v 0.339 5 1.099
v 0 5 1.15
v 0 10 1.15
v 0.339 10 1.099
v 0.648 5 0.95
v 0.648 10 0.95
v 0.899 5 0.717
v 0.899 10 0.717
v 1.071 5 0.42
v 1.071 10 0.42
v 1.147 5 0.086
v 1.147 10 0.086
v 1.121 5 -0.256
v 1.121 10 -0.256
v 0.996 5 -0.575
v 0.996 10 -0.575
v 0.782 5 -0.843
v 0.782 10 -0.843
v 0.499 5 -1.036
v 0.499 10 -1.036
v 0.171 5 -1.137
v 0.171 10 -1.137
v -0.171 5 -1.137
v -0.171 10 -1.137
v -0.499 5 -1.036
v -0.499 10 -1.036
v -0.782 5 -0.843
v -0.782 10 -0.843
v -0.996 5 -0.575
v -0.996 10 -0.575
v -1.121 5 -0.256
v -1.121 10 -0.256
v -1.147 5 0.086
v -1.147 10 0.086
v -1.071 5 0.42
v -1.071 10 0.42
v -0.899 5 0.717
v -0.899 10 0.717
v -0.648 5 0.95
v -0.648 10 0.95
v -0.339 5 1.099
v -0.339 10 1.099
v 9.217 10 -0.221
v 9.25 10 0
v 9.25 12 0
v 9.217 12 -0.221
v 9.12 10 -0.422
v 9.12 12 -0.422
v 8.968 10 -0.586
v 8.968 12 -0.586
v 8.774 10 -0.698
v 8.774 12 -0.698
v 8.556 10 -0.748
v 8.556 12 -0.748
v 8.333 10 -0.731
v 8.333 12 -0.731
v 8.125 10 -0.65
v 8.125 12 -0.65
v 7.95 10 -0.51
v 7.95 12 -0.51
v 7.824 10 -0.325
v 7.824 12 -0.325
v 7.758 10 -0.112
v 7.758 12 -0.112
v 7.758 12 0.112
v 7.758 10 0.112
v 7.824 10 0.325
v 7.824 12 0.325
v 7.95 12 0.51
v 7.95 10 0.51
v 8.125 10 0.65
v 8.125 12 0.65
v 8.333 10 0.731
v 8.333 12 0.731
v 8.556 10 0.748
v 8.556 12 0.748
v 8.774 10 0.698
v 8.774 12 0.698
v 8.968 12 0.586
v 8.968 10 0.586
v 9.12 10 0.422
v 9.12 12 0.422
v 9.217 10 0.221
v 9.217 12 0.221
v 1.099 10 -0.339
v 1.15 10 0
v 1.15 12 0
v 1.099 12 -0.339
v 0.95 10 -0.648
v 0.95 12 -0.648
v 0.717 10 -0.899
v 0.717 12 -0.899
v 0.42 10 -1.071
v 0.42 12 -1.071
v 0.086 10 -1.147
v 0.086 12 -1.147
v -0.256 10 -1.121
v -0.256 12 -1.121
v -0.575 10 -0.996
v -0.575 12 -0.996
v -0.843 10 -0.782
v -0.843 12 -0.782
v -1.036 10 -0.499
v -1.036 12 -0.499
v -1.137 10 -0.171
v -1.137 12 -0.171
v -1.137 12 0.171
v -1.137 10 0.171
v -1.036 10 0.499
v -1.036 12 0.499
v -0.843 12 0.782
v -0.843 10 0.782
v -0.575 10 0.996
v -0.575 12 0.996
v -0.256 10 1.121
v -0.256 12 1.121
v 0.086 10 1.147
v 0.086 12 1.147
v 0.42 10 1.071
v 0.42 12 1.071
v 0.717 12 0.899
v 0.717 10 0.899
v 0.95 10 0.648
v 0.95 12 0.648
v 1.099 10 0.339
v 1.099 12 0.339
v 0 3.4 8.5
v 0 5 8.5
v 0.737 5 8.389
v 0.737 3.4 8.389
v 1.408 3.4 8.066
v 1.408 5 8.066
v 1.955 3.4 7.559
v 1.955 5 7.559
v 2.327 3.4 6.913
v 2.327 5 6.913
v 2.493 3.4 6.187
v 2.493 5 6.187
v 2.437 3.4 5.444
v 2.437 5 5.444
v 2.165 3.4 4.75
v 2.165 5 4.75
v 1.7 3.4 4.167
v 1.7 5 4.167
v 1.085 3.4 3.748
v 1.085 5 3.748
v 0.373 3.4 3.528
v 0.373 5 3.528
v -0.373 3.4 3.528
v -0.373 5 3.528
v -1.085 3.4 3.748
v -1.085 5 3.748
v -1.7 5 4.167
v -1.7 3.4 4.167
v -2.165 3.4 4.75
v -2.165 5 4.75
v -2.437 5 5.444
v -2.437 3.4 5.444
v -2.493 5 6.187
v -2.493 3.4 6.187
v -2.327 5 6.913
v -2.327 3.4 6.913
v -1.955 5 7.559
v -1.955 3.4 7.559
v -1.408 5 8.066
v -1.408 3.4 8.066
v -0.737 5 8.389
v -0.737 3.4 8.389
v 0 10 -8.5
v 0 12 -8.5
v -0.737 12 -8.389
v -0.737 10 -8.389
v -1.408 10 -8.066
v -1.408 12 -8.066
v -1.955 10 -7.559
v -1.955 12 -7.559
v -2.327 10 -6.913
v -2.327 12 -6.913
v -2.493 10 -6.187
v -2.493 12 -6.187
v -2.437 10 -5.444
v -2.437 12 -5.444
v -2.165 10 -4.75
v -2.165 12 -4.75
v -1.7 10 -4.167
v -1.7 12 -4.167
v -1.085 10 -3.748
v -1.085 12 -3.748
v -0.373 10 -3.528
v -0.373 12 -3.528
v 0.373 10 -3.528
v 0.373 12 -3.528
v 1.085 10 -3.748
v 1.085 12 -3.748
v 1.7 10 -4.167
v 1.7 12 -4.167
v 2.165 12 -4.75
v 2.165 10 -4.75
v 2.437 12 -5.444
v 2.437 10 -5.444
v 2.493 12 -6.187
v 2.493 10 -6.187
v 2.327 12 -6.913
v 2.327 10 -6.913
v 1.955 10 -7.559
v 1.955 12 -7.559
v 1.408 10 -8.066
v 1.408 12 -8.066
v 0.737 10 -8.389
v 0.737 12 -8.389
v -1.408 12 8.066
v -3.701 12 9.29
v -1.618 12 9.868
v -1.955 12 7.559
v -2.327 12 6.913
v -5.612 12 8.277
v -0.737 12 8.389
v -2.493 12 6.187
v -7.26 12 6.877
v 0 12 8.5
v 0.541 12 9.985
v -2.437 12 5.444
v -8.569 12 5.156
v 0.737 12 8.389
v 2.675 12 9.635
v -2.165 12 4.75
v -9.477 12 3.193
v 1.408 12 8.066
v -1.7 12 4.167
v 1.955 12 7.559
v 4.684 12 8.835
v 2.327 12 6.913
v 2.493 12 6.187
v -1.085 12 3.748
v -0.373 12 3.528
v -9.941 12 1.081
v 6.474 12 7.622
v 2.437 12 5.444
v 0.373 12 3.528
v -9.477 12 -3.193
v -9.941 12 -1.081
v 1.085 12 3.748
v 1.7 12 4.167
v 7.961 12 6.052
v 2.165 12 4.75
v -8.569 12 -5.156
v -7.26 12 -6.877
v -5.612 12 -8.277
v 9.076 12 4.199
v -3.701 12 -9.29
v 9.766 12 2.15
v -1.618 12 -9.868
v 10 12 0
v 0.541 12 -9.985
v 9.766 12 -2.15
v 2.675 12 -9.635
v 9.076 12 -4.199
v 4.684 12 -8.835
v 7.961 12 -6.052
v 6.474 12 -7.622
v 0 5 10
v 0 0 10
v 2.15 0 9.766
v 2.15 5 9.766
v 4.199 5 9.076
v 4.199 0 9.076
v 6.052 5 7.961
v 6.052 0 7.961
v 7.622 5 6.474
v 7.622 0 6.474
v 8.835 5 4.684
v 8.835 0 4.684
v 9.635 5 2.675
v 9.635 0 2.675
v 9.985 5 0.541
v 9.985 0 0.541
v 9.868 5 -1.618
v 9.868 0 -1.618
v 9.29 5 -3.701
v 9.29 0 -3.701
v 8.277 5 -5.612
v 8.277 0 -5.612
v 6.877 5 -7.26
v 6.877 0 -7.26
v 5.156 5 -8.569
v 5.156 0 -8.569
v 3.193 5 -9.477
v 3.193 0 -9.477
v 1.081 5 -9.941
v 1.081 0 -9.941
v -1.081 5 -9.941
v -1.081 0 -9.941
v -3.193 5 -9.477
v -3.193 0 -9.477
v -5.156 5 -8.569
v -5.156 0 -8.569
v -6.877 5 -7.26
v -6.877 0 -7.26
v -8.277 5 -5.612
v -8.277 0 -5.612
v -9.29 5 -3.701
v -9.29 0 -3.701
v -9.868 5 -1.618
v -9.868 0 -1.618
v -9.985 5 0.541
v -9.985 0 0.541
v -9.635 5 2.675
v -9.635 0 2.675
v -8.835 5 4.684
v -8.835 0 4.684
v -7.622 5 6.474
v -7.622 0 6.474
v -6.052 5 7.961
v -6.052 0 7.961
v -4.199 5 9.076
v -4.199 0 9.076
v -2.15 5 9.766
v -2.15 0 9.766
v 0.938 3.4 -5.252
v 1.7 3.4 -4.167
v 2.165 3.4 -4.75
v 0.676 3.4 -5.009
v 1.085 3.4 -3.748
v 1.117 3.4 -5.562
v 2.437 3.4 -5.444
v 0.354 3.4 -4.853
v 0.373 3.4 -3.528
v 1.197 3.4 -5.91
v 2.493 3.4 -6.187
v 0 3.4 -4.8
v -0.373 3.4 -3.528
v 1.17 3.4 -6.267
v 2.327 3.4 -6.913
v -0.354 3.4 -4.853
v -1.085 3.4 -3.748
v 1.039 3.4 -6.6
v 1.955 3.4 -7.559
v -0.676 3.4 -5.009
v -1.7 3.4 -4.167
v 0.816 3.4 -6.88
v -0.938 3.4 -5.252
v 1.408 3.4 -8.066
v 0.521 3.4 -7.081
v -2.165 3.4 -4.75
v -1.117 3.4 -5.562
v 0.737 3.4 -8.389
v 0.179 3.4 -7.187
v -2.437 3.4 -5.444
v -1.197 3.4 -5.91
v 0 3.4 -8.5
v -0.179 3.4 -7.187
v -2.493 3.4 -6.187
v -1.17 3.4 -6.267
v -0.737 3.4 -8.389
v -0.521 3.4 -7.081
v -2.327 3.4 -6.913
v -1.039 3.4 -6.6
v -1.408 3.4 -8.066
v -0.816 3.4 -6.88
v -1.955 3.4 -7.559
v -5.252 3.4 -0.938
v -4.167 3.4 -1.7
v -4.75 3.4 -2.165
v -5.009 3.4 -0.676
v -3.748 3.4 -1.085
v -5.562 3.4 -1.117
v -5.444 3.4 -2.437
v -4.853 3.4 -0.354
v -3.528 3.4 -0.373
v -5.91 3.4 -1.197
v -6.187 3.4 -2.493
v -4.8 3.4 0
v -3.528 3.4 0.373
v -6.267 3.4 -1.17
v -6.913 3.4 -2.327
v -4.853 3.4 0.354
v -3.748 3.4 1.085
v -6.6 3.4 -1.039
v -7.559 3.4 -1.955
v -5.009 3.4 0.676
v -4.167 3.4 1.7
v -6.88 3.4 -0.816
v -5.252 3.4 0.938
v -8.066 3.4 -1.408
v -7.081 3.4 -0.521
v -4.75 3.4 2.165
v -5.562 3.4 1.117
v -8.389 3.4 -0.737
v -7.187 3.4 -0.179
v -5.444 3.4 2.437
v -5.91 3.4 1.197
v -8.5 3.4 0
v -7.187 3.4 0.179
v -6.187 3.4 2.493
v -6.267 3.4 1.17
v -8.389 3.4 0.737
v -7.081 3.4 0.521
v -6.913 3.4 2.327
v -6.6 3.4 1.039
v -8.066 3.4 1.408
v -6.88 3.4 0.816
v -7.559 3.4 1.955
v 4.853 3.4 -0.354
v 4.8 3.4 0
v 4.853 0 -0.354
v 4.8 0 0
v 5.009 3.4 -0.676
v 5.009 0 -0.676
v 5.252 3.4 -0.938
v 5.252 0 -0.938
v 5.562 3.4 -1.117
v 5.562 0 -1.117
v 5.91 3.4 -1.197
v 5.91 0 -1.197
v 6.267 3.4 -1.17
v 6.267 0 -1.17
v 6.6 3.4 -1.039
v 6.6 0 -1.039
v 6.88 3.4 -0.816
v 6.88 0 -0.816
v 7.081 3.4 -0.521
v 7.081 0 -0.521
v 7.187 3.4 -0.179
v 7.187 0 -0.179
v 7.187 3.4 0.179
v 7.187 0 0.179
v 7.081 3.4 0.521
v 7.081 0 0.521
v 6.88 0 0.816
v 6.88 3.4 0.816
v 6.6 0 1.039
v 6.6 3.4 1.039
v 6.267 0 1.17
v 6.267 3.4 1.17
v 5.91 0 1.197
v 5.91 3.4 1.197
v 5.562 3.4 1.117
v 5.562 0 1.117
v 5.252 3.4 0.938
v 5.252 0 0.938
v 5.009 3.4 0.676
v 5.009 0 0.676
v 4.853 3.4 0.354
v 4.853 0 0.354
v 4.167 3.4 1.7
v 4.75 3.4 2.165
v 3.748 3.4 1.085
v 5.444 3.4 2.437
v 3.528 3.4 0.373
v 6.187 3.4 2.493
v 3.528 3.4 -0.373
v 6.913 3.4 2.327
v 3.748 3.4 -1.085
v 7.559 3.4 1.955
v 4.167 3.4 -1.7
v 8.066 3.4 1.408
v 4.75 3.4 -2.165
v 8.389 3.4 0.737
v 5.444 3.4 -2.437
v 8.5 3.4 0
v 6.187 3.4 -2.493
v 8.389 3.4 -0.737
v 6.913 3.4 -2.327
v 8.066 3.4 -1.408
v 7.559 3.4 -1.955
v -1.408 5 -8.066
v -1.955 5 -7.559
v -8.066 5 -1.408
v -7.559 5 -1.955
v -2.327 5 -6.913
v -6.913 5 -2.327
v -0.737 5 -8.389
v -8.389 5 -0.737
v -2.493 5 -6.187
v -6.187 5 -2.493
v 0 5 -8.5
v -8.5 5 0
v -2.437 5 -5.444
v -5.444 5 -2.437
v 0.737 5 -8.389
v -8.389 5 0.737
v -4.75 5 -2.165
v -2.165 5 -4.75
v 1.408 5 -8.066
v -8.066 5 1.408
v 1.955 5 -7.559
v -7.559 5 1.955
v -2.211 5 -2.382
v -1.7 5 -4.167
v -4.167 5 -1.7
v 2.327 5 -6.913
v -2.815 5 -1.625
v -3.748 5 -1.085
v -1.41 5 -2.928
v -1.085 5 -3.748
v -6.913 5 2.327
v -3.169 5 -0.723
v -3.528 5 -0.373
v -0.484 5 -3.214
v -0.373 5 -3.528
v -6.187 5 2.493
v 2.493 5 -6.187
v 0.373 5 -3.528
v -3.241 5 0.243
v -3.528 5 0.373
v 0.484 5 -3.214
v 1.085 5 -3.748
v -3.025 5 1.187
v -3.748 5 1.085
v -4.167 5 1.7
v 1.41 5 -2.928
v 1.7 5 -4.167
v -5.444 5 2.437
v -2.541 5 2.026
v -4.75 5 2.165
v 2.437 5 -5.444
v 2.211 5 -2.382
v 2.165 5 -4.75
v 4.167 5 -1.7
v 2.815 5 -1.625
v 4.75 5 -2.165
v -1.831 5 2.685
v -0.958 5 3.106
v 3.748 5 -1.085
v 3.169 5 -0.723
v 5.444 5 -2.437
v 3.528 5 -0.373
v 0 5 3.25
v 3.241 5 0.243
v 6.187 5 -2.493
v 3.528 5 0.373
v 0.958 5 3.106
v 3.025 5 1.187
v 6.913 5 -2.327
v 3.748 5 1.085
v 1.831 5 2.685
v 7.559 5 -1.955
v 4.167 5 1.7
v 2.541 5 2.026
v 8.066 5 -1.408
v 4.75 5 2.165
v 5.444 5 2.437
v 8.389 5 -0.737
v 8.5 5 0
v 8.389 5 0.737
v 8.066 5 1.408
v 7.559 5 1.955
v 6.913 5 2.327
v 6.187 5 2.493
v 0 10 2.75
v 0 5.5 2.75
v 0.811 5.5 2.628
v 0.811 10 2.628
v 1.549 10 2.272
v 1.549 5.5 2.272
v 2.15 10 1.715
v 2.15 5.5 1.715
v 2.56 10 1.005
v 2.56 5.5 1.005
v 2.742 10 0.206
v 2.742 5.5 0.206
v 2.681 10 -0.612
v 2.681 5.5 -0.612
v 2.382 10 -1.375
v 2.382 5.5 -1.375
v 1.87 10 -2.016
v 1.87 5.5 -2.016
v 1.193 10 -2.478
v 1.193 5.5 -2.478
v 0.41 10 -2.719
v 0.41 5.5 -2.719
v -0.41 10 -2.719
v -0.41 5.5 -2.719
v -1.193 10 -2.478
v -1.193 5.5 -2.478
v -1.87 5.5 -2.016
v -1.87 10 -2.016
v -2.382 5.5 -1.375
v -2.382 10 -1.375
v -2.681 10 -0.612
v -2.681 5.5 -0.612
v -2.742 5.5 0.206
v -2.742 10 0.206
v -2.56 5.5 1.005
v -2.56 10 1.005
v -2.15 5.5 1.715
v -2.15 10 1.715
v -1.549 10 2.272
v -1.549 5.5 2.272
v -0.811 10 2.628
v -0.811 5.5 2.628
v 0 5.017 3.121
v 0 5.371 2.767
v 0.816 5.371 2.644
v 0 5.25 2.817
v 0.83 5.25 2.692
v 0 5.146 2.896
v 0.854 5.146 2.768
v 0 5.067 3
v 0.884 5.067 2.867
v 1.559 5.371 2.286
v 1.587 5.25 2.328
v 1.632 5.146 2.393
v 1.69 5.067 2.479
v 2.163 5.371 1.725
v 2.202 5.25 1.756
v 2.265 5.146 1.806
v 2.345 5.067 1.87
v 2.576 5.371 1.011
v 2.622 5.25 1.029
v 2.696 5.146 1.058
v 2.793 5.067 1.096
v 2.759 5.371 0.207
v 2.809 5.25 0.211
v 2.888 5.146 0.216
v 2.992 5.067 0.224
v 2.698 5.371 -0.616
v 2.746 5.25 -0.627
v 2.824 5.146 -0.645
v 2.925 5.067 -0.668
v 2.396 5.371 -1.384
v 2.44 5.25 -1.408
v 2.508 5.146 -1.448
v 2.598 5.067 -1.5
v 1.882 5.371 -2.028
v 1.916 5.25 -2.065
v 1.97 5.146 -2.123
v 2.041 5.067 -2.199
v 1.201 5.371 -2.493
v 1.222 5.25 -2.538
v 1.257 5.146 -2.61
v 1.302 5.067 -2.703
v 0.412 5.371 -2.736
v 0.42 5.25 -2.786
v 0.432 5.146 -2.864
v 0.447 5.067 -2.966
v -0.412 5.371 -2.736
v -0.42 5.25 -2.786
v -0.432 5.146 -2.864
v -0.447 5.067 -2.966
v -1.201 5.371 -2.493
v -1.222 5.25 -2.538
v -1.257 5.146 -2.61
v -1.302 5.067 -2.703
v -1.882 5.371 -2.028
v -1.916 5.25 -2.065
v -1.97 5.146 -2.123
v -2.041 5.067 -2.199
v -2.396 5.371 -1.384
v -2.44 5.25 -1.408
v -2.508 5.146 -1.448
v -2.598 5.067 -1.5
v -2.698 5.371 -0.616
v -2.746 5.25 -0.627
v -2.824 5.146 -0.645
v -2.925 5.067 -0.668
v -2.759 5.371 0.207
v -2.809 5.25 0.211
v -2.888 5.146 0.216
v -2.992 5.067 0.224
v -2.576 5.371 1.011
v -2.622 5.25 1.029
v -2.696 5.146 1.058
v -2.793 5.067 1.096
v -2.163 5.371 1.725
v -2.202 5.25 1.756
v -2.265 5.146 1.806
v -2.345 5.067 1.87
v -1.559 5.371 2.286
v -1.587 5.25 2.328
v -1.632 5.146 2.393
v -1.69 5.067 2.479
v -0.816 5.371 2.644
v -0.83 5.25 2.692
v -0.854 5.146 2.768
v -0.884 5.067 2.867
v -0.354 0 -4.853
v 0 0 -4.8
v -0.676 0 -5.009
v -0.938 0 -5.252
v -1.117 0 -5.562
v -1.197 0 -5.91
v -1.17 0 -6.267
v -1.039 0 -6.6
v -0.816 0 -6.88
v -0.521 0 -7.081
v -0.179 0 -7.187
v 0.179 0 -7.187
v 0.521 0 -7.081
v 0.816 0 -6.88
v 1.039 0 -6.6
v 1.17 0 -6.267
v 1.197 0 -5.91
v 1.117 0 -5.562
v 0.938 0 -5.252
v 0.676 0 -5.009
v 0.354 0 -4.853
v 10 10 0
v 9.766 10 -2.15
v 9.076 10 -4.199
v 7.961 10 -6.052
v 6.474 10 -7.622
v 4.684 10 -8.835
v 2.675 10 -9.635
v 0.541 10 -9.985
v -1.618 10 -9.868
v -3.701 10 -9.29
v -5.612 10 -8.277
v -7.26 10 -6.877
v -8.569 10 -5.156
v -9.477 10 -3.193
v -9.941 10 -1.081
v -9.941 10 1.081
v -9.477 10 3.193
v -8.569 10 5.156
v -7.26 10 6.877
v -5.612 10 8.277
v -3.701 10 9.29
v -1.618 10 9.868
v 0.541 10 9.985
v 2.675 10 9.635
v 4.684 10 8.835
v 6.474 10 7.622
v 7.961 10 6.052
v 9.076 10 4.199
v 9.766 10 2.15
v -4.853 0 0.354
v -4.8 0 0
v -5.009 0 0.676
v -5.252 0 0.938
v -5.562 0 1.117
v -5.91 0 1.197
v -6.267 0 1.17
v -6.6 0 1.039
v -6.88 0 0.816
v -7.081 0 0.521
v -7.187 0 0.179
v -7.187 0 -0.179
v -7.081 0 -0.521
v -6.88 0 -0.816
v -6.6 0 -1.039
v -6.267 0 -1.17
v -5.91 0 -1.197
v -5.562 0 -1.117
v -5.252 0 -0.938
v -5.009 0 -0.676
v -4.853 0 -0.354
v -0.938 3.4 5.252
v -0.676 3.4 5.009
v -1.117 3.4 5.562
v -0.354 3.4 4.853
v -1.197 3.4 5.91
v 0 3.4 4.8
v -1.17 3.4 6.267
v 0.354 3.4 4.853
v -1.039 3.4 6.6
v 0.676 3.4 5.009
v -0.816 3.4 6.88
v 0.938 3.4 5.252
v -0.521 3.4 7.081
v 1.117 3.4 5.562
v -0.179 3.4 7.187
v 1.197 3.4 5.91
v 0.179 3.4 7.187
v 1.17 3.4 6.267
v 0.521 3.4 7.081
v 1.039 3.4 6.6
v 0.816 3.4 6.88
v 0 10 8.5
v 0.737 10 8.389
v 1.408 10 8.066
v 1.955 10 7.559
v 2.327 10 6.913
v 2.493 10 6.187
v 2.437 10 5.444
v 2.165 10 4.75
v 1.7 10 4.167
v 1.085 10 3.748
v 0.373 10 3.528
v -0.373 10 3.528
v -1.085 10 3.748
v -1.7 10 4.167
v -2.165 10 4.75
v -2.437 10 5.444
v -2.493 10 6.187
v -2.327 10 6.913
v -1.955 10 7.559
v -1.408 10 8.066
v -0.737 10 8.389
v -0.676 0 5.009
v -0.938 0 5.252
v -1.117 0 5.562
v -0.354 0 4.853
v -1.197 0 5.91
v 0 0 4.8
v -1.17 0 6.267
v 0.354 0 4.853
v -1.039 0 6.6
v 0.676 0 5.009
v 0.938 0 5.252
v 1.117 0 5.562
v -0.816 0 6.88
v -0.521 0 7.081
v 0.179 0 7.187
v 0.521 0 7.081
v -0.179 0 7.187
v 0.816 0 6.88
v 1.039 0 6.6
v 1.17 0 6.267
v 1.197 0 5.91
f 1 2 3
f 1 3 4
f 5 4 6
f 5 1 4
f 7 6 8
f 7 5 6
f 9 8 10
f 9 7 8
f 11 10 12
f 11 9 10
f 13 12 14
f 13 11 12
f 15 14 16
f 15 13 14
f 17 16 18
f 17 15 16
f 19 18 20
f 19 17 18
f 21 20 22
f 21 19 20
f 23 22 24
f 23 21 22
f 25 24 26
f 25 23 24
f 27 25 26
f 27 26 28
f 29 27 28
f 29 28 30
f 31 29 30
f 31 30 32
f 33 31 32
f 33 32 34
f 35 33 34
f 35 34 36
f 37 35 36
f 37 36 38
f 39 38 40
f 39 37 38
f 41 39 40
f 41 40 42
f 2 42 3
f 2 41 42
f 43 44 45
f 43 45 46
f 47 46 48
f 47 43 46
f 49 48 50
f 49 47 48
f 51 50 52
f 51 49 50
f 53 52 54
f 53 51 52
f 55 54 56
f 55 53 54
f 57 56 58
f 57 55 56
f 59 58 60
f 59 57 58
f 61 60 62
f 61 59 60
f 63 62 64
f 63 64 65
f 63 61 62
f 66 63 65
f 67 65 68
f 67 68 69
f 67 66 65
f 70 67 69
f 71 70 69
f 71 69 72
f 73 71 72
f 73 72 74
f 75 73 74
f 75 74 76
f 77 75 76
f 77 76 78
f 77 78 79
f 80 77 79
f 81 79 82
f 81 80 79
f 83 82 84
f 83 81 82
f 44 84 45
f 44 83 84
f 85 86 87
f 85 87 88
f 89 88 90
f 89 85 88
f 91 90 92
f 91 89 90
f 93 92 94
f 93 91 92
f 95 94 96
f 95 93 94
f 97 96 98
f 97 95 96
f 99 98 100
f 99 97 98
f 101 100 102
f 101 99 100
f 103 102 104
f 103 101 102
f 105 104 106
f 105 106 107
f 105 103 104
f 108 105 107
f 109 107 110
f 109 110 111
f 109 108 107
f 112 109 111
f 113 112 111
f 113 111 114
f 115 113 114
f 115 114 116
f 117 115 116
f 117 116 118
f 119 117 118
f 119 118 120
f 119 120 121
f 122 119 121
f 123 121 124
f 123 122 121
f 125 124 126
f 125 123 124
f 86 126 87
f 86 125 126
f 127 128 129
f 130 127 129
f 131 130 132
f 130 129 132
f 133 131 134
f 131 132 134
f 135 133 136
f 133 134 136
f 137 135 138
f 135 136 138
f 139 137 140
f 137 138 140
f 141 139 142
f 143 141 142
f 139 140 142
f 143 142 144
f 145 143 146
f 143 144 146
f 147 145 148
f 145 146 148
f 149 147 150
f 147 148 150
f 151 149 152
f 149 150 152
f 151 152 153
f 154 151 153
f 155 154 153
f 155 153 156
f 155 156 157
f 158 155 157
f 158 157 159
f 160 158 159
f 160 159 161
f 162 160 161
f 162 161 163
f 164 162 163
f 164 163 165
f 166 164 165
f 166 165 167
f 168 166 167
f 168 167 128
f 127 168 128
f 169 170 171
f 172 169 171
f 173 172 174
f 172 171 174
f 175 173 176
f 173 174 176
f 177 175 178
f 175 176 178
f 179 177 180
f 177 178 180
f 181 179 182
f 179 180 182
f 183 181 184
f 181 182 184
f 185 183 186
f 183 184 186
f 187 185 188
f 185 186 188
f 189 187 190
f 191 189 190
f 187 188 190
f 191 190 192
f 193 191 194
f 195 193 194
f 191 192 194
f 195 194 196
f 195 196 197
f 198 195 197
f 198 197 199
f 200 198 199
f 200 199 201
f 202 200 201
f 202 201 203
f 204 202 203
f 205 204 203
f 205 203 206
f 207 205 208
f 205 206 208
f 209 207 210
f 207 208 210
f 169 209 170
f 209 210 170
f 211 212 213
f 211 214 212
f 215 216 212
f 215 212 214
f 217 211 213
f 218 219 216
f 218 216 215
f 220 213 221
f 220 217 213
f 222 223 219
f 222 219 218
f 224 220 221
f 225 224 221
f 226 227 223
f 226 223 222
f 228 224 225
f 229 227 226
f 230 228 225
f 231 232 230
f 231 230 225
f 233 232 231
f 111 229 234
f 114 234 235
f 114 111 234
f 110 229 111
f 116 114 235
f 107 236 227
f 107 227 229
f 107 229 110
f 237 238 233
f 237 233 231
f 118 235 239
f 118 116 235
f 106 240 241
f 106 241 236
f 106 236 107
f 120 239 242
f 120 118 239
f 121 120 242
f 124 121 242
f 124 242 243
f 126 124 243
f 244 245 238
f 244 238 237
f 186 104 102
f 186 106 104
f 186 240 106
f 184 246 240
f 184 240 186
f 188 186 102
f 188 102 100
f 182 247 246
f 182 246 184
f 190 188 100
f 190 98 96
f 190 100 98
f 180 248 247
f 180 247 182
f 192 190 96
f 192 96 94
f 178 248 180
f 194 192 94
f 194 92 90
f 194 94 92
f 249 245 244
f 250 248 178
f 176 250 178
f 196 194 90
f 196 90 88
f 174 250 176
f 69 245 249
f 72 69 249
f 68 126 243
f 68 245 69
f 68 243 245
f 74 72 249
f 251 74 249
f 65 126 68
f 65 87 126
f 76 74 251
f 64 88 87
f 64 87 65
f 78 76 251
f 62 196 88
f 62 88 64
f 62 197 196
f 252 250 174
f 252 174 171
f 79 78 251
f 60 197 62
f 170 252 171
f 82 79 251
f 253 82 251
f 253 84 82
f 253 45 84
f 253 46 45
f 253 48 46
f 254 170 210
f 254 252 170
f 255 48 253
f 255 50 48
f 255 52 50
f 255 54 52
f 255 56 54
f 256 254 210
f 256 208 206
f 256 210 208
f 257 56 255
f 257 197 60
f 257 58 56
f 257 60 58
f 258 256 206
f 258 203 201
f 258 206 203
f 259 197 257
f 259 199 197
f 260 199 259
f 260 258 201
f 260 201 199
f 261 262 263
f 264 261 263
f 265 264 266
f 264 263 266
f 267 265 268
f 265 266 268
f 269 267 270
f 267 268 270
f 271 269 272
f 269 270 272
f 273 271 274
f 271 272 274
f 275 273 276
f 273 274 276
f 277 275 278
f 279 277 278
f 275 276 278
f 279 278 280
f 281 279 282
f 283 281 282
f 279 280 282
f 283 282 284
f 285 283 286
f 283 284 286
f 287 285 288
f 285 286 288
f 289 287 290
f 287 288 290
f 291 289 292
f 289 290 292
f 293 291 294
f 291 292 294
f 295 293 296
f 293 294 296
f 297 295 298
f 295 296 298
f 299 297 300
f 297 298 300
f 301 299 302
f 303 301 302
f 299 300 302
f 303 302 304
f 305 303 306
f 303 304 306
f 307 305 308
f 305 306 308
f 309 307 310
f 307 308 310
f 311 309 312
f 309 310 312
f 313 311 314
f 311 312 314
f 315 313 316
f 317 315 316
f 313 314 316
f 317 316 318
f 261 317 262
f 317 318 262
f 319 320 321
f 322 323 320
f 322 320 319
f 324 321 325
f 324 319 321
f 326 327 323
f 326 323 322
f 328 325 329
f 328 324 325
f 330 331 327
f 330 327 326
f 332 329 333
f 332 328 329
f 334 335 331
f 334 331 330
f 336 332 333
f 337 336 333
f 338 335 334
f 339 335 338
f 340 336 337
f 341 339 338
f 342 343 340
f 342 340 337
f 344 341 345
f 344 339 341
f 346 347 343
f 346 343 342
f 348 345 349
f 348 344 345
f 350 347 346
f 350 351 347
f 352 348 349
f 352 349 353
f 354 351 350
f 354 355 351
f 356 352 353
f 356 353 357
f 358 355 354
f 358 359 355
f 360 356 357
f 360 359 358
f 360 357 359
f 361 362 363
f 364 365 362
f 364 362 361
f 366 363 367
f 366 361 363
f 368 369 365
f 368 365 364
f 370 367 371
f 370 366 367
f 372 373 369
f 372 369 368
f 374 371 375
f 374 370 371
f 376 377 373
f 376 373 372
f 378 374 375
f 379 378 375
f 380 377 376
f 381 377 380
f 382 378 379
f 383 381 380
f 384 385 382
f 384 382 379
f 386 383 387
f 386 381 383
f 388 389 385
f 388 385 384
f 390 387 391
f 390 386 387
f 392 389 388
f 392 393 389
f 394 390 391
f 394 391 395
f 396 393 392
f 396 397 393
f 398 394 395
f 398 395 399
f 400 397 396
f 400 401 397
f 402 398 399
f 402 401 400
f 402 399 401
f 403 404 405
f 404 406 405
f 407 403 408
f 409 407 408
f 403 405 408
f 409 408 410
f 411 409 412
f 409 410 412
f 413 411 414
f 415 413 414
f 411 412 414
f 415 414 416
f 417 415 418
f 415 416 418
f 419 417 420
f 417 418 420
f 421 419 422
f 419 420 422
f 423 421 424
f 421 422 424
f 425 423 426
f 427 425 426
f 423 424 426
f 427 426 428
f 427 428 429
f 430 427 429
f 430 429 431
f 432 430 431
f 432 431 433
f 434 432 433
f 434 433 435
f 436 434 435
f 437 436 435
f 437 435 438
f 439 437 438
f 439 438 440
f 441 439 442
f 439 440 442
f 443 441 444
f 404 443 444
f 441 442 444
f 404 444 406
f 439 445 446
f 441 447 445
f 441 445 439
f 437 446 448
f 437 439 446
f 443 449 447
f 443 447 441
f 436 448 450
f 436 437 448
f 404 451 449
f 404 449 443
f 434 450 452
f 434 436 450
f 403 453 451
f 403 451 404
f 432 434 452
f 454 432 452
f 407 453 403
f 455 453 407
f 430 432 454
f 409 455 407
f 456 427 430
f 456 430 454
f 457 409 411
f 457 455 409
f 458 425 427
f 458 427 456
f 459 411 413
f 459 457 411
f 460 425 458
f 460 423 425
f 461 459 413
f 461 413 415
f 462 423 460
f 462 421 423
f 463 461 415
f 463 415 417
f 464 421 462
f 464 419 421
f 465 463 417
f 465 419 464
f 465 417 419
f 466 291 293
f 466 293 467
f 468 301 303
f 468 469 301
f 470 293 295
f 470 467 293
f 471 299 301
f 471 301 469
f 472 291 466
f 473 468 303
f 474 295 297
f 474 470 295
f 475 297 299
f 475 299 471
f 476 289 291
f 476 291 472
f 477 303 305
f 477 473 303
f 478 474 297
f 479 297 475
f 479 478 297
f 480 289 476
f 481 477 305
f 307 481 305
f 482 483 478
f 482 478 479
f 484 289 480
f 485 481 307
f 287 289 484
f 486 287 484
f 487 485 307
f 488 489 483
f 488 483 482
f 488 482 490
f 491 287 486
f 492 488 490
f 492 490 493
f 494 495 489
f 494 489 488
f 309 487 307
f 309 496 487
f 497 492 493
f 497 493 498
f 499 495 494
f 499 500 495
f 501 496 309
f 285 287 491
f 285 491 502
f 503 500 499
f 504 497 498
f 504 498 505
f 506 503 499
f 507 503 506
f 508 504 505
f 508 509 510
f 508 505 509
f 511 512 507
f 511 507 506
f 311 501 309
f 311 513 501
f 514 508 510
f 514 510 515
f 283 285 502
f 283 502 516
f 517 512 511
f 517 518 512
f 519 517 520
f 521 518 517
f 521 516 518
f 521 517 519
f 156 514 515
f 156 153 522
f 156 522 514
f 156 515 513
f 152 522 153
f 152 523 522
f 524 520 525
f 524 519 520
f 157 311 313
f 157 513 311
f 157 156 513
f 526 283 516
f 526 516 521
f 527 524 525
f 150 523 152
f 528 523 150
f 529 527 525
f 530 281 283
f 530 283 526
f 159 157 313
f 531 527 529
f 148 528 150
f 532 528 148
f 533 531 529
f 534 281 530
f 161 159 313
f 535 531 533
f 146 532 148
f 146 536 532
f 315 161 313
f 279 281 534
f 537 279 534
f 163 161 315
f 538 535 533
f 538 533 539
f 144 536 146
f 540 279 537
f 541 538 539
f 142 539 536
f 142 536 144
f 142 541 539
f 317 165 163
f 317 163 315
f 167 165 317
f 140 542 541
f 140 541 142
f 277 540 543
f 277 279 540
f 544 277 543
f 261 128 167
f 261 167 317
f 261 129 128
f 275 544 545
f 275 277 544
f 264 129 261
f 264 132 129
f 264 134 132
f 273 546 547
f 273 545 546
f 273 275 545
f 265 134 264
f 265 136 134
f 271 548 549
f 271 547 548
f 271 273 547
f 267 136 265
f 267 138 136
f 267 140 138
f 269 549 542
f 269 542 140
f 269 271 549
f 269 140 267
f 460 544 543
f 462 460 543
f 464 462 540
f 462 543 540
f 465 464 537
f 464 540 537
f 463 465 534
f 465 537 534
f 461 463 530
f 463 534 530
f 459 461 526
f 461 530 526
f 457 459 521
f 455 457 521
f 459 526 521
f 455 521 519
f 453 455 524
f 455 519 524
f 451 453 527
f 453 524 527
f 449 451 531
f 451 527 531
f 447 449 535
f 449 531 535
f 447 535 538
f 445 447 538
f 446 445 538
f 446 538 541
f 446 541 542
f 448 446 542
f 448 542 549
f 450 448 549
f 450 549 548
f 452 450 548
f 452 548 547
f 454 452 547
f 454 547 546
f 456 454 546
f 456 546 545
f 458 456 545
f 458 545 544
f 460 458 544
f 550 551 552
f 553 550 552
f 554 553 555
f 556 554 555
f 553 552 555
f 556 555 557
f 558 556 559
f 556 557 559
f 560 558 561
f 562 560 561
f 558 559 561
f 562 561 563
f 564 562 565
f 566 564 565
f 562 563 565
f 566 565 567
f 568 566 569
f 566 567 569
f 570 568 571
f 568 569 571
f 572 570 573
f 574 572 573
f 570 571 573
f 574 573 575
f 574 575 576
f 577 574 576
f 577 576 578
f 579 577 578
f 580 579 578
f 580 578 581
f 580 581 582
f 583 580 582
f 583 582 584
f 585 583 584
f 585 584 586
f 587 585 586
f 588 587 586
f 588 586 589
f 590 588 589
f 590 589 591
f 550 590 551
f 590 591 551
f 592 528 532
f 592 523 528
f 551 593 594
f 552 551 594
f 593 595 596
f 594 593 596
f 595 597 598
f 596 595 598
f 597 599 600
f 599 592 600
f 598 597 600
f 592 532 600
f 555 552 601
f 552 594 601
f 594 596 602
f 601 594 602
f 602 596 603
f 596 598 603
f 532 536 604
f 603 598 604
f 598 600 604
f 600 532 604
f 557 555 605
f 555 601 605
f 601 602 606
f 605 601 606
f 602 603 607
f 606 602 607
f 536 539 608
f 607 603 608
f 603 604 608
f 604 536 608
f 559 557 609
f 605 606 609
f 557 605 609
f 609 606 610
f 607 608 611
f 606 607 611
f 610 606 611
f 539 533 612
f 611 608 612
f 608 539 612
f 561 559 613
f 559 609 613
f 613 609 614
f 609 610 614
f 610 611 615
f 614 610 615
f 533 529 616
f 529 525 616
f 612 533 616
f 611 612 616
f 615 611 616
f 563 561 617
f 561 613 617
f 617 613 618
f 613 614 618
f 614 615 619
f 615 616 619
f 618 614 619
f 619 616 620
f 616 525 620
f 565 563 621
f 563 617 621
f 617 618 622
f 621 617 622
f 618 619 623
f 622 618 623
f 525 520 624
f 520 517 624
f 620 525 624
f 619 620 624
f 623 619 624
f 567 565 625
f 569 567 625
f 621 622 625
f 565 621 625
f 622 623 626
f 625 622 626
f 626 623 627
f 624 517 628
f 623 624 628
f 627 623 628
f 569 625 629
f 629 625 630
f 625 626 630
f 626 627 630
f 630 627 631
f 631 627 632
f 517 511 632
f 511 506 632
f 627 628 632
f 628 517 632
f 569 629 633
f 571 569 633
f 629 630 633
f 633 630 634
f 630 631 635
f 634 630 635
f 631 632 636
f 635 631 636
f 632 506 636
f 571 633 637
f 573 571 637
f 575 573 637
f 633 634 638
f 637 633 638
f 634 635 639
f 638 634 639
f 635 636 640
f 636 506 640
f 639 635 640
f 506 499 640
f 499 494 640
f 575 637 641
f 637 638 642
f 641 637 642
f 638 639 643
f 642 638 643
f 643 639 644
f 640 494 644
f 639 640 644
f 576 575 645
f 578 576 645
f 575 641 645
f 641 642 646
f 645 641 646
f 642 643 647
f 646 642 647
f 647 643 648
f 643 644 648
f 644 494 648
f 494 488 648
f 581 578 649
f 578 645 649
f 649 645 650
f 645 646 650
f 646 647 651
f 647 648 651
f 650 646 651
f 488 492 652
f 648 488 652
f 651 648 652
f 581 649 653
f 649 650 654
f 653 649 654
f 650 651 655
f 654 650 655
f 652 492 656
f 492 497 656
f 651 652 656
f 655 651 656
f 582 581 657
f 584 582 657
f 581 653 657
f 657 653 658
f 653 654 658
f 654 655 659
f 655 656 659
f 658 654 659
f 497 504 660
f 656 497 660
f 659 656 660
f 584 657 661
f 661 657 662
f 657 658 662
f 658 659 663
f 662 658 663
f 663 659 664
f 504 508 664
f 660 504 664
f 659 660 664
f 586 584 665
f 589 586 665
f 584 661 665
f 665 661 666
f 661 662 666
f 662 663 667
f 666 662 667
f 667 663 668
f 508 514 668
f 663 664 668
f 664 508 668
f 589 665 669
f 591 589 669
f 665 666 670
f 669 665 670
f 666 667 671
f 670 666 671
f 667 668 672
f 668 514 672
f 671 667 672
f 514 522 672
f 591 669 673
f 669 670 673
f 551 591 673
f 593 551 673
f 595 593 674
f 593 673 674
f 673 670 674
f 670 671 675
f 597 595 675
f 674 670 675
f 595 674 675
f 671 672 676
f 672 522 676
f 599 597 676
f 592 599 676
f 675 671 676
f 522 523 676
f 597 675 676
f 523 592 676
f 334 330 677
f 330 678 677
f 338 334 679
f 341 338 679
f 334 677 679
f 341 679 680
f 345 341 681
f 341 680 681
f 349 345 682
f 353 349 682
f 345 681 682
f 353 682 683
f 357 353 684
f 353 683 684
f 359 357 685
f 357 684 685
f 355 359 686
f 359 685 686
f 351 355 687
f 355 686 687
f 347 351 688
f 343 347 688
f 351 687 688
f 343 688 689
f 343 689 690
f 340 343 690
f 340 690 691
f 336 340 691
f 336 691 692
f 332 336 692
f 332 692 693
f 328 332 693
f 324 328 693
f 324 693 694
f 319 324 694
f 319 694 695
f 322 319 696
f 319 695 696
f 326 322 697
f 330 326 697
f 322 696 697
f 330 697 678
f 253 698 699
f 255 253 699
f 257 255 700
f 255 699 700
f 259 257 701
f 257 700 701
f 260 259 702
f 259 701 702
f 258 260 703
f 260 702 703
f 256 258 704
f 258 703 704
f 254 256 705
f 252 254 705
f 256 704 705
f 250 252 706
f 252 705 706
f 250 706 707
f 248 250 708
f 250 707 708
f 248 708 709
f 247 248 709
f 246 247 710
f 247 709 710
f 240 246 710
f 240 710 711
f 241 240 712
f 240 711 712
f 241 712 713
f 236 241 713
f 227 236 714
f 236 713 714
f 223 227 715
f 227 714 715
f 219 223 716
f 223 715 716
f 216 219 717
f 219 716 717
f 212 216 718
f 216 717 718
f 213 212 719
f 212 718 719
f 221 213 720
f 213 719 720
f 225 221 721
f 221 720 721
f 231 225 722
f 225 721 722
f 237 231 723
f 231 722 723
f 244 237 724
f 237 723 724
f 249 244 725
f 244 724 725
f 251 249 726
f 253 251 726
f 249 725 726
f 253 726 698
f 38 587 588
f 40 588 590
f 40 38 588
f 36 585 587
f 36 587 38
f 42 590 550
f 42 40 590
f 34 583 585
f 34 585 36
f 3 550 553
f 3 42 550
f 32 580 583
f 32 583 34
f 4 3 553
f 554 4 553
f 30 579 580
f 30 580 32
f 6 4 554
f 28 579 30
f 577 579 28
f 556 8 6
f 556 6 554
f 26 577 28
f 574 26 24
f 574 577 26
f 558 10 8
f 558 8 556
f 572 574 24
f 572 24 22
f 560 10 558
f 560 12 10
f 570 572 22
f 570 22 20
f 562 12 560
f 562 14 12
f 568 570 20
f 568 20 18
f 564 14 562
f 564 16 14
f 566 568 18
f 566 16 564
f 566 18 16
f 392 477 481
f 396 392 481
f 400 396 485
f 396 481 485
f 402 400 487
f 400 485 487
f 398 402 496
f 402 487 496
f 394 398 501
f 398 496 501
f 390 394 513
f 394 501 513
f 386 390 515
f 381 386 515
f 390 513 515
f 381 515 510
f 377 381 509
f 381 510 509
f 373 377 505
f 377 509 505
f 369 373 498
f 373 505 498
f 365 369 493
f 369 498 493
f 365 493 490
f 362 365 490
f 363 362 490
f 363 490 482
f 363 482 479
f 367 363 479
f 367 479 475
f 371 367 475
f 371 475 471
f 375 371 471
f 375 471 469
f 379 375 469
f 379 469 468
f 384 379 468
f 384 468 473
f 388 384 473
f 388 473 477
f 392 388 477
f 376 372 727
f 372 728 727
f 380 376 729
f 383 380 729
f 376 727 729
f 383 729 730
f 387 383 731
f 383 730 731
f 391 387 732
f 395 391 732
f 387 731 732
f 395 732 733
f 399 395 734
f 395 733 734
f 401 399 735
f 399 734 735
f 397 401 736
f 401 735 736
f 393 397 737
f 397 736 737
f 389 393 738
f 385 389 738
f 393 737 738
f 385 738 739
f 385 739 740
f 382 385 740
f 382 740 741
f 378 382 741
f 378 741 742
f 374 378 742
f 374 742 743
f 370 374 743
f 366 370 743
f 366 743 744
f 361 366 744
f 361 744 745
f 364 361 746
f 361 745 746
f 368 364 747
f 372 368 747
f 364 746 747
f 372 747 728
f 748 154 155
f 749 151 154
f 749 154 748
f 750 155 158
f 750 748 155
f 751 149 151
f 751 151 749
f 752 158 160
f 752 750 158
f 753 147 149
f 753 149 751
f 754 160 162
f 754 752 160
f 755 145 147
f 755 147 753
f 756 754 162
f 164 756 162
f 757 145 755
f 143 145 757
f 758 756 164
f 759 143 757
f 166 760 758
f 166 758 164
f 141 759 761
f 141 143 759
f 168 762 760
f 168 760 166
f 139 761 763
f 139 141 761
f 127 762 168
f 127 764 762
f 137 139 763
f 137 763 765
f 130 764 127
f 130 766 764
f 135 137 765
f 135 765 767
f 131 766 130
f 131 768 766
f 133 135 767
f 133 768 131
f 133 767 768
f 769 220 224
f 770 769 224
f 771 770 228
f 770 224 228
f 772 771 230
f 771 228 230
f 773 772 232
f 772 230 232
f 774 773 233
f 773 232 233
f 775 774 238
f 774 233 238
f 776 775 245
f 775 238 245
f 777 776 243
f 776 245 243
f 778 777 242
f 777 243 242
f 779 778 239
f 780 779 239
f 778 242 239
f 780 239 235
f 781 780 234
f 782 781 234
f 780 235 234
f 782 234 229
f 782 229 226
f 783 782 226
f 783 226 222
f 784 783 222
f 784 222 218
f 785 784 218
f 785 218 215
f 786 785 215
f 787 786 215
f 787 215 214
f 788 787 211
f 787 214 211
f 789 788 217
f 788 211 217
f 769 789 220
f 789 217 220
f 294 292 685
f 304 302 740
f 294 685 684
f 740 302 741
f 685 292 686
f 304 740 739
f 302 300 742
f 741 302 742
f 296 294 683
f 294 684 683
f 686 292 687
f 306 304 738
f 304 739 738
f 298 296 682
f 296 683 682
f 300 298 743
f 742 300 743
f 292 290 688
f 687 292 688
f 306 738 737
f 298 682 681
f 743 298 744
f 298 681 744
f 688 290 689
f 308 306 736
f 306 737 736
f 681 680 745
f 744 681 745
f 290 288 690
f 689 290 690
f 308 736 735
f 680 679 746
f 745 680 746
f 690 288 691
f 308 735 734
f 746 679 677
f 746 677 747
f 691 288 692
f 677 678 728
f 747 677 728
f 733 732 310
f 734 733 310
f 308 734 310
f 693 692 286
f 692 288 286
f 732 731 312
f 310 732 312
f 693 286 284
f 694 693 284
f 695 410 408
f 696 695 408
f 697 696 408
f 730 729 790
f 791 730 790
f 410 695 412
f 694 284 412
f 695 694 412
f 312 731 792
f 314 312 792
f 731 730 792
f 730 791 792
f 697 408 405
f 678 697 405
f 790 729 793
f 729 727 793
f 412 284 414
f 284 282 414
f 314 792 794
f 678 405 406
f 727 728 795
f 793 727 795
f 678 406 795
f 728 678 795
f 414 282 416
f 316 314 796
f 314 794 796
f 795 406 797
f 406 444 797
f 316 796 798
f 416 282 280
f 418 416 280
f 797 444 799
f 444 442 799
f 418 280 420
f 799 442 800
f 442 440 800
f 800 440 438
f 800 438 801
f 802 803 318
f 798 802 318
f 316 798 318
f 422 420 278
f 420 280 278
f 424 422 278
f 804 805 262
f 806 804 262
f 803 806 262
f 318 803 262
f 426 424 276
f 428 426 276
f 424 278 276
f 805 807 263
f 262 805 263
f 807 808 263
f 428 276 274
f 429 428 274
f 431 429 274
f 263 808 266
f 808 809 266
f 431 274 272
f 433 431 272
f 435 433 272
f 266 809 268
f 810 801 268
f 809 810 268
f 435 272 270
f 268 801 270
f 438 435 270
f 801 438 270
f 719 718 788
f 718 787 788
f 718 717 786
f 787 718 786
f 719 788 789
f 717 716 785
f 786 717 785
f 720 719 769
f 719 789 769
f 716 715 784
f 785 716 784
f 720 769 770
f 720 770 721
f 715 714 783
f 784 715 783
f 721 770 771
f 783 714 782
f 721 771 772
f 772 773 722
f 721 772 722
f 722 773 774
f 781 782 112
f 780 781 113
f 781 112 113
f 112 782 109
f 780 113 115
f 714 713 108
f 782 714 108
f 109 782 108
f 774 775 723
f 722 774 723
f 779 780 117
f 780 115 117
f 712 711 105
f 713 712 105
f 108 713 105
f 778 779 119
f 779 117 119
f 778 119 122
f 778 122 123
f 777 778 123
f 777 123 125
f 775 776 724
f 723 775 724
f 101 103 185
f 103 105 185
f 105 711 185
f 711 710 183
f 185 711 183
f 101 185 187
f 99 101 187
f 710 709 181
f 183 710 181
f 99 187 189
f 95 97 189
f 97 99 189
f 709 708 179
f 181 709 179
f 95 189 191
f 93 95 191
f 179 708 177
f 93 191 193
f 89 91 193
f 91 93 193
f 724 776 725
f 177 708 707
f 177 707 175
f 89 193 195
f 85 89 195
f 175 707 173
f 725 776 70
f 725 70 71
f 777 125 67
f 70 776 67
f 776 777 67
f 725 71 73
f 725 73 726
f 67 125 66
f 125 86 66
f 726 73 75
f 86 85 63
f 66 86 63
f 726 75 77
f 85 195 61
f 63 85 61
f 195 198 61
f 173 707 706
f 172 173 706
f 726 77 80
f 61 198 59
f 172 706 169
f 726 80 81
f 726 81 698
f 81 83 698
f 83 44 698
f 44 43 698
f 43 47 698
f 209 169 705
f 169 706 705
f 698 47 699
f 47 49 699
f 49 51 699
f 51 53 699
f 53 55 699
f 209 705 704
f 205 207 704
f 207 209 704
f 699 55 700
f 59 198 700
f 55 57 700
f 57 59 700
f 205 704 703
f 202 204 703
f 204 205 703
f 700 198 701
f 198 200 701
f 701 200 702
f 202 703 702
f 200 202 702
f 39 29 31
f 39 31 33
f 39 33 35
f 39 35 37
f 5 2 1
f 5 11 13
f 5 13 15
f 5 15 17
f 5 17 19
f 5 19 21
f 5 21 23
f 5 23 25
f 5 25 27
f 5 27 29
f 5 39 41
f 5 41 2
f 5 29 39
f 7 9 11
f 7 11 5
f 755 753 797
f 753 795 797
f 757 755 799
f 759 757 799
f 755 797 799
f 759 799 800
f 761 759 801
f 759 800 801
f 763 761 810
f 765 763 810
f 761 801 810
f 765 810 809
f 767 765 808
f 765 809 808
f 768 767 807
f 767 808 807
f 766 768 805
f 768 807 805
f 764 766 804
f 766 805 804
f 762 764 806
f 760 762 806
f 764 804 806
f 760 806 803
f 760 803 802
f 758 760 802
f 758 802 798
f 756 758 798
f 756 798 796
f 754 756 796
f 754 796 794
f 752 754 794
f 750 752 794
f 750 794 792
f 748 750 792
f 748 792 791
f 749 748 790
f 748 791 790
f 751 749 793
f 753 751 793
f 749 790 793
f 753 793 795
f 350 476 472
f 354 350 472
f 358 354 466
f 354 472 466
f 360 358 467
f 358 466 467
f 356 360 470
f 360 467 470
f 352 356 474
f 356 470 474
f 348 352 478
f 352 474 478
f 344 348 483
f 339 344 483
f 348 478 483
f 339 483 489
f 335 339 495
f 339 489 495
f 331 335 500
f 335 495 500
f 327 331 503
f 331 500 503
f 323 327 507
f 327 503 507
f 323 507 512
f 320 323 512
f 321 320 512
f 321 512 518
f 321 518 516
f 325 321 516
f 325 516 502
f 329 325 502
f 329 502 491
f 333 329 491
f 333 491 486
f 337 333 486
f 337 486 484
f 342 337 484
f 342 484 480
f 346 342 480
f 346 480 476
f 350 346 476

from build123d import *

# Parameters (mm, degrees)
SKETCH1_R                                = 10
BOTTOM_DEPTH                             = 5
CBORE_FOR_M2_PAN_HEAD_SCREW1_D           = 2.4
CBORE_FOR_M2_PAN_HEAD_SCREW1_CBORE_D     = 5
CBORE_FOR_M2_PAN_HEAD_SCREW1_CBORE_DEPTH = 1.6
SKETCH4_R                                = 2.75
GROOVE_DEPTH                             = 5
CIRPATTERN1_COUNT                        = 4
SKETCH7_R                                = 10
TOP_DEPTH                                = 2
SKETCH8_R                                = 0.75
THREAD_TERMINAL_DEPTH                    = 2
SKETCH9_R                                = 1.15
M2_PIN_INSERT_DEPTH                      = 7
FILLET1_R                                = 0.5
SPLIT1_START                             = 10
SPLIT1_OUTLINE_R                         = 10
SPLIT1_OUTLINE_R_2                       = 1.15
SPLIT1_OUTLINE_R_3                       = 0.75
SPLIT1_DEPTH                             = 2
SPLIT1_2_OUTLINE_R                       = 10
SPLIT1_2_OUTLINE_R_2                     = 1.15
SPLIT1_2_OUTLINE_R_3                     = 0.75
SPLIT1_2_DEPTH                           = 2
SKETCH10_R                               = 2.5
CUT_EXTRUDE1_DEPTH                       = 2
HOLES_FOR_SCREWDRIVERS_COUNT             = 2


# Read off the part's stored shape, not the designer's step: Split1
with BuildPart() as part:
    # Sketch1 → bottom (new body)
    with BuildSketch(Plane(origin=(0, 0, 0), x_dir=(1, 0, 0), z_dir=(0, 1, 0))):
        with Locations(Location((0, 0, 0), (0, 0, 270))):
            Circle(SKETCH1_R)
    extrude(amount=BOTTOM_DEPTH)

    # CBORE for M2 Pan Head Screw1 (through all)
    with Locations(Plane(origin=(0, 5, 0), x_dir=(1, 0, 0), z_dir=(0, 1, 0))):
        with Locations((6, 0)):
            cbore_for_m2_pan_head_screw1 = CounterBoreHole(CBORE_FOR_M2_PAN_HEAD_SCREW1_D / 2, CBORE_FOR_M2_PAN_HEAD_SCREW1_CBORE_D / 2, CBORE_FOR_M2_PAN_HEAD_SCREW1_CBORE_DEPTH)

    # Sketch4 → groove (add)
    with BuildSketch(Plane(origin=(0, 5, 0), x_dir=(1, 0, 0), z_dir=(0, 1, 0))):
        with Locations(Location((0, 0, 0), (0, 0, 270))):
            Circle(SKETCH4_R)
    extrude(amount=GROOVE_DEPTH)

    # CirPattern1: CBORE for M2 Pan Head Screw1 ×4 about axis
    cirpattern1_axis = Axis((0, 0, 0), (0, 1, 0))
    for i in range(1, CIRPATTERN1_COUNT):
        add(cbore_for_m2_pan_head_screw1.rotate(cirpattern1_axis, i * 360 / CIRPATTERN1_COUNT), mode=Mode.SUBTRACT)

    # Sketch7 → top (add)
    with BuildSketch(Plane(origin=(0, 10, 0), x_dir=(1, 0, 0), z_dir=(0, 1, 0))):
        with Locations(Location((0, 0, 0), (0, 0, 270))):
            Circle(SKETCH7_R)
    extrude(amount=TOP_DEPTH)

    # Sketch8 → thread_terminal (cut)
    with BuildSketch(Plane(origin=(0, 12, 0), x_dir=(1, 0, 0), z_dir=(0, 1, 0))):
        with Locations(Location((8.5, 0, 0), (0, 0, 270))):
            Circle(SKETCH8_R)
    extrude(amount=-THREAD_TERMINAL_DEPTH, mode=Mode.SUBTRACT)

    # Sketch9 → M2 pin_insert (cut)
    with BuildSketch(Plane(origin=(0, 5, 0), x_dir=(1, 0, 0), z_dir=(0, 1, 0))):
        with Locations(Location((0, 0, 0), (0, 0, 270))):
            Circle(SKETCH9_R)
    extrude(amount=M2_PIN_INSERT_DEPTH, mode=Mode.SUBTRACT)

    # Fillet1
    fillet1_edges = [part.edges().sort_by_distance(p)[0] for p in [
        (0, 5, -2.75),
    ]]
    fillet(fillet1_edges, radius=FILLET1_R)

    # Split1 2 outline → Split1 2 (cut)
    with BuildSketch(Plane(origin=(0, 0, 0), x_dir=(1, 0, 0), z_dir=(0, 1, 0)).offset(SPLIT1_START)):
        Circle(SPLIT1_2_OUTLINE_R)
        Circle(SPLIT1_2_OUTLINE_R_2, mode=Mode.SUBTRACT)
        with Locations((8.5, 0)):
            Circle(SPLIT1_2_OUTLINE_R_3, mode=Mode.SUBTRACT)
    extrude(amount=SPLIT1_2_DEPTH, mode=Mode.SUBTRACT)


with BuildPart() as body_2:
    # Split1 outline → Split1 (new body)
    with BuildSketch(Plane(origin=(0, 0, 0), x_dir=(1, 0, 0), z_dir=(0, 1, 0)).offset(SPLIT1_START)):
        Circle(SPLIT1_OUTLINE_R)
        Circle(SPLIT1_OUTLINE_R_2, mode=Mode.SUBTRACT)
        with Locations((8.5, 0)):
            Circle(SPLIT1_OUTLINE_R_3, mode=Mode.SUBTRACT)
    extrude(amount=SPLIT1_DEPTH)

    # Sketch10 → Cut-Extrude1 (cut)
    with BuildSketch(Plane(origin=(0, 12, 0), x_dir=(1, 0, 0), z_dir=(0, 1, 0))):
        with Locations(Location((0, -6, 0), (0, 0, 270))):
            Circle(SKETCH10_R)
    cut_extrude1 = extrude(amount=-CUT_EXTRUDE1_DEPTH, mode=Mode.SUBTRACT)

    # holes_for_screwdrivers: Cut-Extrude1 ×2 about axis
    holes_for_screwdrivers_axis = Axis((0, 0, 0), (0, 1, 0))
    for i in range(1, HOLES_FOR_SCREWDRIVERS_COUNT):
        add(cut_extrude1.rotate(holes_for_screwdrivers_axis, i * 360 / HOLES_FOR_SCREWDRIVERS_COUNT), mode=Mode.SUBTRACT)


solid = Compound([part.part, body_2.part])
